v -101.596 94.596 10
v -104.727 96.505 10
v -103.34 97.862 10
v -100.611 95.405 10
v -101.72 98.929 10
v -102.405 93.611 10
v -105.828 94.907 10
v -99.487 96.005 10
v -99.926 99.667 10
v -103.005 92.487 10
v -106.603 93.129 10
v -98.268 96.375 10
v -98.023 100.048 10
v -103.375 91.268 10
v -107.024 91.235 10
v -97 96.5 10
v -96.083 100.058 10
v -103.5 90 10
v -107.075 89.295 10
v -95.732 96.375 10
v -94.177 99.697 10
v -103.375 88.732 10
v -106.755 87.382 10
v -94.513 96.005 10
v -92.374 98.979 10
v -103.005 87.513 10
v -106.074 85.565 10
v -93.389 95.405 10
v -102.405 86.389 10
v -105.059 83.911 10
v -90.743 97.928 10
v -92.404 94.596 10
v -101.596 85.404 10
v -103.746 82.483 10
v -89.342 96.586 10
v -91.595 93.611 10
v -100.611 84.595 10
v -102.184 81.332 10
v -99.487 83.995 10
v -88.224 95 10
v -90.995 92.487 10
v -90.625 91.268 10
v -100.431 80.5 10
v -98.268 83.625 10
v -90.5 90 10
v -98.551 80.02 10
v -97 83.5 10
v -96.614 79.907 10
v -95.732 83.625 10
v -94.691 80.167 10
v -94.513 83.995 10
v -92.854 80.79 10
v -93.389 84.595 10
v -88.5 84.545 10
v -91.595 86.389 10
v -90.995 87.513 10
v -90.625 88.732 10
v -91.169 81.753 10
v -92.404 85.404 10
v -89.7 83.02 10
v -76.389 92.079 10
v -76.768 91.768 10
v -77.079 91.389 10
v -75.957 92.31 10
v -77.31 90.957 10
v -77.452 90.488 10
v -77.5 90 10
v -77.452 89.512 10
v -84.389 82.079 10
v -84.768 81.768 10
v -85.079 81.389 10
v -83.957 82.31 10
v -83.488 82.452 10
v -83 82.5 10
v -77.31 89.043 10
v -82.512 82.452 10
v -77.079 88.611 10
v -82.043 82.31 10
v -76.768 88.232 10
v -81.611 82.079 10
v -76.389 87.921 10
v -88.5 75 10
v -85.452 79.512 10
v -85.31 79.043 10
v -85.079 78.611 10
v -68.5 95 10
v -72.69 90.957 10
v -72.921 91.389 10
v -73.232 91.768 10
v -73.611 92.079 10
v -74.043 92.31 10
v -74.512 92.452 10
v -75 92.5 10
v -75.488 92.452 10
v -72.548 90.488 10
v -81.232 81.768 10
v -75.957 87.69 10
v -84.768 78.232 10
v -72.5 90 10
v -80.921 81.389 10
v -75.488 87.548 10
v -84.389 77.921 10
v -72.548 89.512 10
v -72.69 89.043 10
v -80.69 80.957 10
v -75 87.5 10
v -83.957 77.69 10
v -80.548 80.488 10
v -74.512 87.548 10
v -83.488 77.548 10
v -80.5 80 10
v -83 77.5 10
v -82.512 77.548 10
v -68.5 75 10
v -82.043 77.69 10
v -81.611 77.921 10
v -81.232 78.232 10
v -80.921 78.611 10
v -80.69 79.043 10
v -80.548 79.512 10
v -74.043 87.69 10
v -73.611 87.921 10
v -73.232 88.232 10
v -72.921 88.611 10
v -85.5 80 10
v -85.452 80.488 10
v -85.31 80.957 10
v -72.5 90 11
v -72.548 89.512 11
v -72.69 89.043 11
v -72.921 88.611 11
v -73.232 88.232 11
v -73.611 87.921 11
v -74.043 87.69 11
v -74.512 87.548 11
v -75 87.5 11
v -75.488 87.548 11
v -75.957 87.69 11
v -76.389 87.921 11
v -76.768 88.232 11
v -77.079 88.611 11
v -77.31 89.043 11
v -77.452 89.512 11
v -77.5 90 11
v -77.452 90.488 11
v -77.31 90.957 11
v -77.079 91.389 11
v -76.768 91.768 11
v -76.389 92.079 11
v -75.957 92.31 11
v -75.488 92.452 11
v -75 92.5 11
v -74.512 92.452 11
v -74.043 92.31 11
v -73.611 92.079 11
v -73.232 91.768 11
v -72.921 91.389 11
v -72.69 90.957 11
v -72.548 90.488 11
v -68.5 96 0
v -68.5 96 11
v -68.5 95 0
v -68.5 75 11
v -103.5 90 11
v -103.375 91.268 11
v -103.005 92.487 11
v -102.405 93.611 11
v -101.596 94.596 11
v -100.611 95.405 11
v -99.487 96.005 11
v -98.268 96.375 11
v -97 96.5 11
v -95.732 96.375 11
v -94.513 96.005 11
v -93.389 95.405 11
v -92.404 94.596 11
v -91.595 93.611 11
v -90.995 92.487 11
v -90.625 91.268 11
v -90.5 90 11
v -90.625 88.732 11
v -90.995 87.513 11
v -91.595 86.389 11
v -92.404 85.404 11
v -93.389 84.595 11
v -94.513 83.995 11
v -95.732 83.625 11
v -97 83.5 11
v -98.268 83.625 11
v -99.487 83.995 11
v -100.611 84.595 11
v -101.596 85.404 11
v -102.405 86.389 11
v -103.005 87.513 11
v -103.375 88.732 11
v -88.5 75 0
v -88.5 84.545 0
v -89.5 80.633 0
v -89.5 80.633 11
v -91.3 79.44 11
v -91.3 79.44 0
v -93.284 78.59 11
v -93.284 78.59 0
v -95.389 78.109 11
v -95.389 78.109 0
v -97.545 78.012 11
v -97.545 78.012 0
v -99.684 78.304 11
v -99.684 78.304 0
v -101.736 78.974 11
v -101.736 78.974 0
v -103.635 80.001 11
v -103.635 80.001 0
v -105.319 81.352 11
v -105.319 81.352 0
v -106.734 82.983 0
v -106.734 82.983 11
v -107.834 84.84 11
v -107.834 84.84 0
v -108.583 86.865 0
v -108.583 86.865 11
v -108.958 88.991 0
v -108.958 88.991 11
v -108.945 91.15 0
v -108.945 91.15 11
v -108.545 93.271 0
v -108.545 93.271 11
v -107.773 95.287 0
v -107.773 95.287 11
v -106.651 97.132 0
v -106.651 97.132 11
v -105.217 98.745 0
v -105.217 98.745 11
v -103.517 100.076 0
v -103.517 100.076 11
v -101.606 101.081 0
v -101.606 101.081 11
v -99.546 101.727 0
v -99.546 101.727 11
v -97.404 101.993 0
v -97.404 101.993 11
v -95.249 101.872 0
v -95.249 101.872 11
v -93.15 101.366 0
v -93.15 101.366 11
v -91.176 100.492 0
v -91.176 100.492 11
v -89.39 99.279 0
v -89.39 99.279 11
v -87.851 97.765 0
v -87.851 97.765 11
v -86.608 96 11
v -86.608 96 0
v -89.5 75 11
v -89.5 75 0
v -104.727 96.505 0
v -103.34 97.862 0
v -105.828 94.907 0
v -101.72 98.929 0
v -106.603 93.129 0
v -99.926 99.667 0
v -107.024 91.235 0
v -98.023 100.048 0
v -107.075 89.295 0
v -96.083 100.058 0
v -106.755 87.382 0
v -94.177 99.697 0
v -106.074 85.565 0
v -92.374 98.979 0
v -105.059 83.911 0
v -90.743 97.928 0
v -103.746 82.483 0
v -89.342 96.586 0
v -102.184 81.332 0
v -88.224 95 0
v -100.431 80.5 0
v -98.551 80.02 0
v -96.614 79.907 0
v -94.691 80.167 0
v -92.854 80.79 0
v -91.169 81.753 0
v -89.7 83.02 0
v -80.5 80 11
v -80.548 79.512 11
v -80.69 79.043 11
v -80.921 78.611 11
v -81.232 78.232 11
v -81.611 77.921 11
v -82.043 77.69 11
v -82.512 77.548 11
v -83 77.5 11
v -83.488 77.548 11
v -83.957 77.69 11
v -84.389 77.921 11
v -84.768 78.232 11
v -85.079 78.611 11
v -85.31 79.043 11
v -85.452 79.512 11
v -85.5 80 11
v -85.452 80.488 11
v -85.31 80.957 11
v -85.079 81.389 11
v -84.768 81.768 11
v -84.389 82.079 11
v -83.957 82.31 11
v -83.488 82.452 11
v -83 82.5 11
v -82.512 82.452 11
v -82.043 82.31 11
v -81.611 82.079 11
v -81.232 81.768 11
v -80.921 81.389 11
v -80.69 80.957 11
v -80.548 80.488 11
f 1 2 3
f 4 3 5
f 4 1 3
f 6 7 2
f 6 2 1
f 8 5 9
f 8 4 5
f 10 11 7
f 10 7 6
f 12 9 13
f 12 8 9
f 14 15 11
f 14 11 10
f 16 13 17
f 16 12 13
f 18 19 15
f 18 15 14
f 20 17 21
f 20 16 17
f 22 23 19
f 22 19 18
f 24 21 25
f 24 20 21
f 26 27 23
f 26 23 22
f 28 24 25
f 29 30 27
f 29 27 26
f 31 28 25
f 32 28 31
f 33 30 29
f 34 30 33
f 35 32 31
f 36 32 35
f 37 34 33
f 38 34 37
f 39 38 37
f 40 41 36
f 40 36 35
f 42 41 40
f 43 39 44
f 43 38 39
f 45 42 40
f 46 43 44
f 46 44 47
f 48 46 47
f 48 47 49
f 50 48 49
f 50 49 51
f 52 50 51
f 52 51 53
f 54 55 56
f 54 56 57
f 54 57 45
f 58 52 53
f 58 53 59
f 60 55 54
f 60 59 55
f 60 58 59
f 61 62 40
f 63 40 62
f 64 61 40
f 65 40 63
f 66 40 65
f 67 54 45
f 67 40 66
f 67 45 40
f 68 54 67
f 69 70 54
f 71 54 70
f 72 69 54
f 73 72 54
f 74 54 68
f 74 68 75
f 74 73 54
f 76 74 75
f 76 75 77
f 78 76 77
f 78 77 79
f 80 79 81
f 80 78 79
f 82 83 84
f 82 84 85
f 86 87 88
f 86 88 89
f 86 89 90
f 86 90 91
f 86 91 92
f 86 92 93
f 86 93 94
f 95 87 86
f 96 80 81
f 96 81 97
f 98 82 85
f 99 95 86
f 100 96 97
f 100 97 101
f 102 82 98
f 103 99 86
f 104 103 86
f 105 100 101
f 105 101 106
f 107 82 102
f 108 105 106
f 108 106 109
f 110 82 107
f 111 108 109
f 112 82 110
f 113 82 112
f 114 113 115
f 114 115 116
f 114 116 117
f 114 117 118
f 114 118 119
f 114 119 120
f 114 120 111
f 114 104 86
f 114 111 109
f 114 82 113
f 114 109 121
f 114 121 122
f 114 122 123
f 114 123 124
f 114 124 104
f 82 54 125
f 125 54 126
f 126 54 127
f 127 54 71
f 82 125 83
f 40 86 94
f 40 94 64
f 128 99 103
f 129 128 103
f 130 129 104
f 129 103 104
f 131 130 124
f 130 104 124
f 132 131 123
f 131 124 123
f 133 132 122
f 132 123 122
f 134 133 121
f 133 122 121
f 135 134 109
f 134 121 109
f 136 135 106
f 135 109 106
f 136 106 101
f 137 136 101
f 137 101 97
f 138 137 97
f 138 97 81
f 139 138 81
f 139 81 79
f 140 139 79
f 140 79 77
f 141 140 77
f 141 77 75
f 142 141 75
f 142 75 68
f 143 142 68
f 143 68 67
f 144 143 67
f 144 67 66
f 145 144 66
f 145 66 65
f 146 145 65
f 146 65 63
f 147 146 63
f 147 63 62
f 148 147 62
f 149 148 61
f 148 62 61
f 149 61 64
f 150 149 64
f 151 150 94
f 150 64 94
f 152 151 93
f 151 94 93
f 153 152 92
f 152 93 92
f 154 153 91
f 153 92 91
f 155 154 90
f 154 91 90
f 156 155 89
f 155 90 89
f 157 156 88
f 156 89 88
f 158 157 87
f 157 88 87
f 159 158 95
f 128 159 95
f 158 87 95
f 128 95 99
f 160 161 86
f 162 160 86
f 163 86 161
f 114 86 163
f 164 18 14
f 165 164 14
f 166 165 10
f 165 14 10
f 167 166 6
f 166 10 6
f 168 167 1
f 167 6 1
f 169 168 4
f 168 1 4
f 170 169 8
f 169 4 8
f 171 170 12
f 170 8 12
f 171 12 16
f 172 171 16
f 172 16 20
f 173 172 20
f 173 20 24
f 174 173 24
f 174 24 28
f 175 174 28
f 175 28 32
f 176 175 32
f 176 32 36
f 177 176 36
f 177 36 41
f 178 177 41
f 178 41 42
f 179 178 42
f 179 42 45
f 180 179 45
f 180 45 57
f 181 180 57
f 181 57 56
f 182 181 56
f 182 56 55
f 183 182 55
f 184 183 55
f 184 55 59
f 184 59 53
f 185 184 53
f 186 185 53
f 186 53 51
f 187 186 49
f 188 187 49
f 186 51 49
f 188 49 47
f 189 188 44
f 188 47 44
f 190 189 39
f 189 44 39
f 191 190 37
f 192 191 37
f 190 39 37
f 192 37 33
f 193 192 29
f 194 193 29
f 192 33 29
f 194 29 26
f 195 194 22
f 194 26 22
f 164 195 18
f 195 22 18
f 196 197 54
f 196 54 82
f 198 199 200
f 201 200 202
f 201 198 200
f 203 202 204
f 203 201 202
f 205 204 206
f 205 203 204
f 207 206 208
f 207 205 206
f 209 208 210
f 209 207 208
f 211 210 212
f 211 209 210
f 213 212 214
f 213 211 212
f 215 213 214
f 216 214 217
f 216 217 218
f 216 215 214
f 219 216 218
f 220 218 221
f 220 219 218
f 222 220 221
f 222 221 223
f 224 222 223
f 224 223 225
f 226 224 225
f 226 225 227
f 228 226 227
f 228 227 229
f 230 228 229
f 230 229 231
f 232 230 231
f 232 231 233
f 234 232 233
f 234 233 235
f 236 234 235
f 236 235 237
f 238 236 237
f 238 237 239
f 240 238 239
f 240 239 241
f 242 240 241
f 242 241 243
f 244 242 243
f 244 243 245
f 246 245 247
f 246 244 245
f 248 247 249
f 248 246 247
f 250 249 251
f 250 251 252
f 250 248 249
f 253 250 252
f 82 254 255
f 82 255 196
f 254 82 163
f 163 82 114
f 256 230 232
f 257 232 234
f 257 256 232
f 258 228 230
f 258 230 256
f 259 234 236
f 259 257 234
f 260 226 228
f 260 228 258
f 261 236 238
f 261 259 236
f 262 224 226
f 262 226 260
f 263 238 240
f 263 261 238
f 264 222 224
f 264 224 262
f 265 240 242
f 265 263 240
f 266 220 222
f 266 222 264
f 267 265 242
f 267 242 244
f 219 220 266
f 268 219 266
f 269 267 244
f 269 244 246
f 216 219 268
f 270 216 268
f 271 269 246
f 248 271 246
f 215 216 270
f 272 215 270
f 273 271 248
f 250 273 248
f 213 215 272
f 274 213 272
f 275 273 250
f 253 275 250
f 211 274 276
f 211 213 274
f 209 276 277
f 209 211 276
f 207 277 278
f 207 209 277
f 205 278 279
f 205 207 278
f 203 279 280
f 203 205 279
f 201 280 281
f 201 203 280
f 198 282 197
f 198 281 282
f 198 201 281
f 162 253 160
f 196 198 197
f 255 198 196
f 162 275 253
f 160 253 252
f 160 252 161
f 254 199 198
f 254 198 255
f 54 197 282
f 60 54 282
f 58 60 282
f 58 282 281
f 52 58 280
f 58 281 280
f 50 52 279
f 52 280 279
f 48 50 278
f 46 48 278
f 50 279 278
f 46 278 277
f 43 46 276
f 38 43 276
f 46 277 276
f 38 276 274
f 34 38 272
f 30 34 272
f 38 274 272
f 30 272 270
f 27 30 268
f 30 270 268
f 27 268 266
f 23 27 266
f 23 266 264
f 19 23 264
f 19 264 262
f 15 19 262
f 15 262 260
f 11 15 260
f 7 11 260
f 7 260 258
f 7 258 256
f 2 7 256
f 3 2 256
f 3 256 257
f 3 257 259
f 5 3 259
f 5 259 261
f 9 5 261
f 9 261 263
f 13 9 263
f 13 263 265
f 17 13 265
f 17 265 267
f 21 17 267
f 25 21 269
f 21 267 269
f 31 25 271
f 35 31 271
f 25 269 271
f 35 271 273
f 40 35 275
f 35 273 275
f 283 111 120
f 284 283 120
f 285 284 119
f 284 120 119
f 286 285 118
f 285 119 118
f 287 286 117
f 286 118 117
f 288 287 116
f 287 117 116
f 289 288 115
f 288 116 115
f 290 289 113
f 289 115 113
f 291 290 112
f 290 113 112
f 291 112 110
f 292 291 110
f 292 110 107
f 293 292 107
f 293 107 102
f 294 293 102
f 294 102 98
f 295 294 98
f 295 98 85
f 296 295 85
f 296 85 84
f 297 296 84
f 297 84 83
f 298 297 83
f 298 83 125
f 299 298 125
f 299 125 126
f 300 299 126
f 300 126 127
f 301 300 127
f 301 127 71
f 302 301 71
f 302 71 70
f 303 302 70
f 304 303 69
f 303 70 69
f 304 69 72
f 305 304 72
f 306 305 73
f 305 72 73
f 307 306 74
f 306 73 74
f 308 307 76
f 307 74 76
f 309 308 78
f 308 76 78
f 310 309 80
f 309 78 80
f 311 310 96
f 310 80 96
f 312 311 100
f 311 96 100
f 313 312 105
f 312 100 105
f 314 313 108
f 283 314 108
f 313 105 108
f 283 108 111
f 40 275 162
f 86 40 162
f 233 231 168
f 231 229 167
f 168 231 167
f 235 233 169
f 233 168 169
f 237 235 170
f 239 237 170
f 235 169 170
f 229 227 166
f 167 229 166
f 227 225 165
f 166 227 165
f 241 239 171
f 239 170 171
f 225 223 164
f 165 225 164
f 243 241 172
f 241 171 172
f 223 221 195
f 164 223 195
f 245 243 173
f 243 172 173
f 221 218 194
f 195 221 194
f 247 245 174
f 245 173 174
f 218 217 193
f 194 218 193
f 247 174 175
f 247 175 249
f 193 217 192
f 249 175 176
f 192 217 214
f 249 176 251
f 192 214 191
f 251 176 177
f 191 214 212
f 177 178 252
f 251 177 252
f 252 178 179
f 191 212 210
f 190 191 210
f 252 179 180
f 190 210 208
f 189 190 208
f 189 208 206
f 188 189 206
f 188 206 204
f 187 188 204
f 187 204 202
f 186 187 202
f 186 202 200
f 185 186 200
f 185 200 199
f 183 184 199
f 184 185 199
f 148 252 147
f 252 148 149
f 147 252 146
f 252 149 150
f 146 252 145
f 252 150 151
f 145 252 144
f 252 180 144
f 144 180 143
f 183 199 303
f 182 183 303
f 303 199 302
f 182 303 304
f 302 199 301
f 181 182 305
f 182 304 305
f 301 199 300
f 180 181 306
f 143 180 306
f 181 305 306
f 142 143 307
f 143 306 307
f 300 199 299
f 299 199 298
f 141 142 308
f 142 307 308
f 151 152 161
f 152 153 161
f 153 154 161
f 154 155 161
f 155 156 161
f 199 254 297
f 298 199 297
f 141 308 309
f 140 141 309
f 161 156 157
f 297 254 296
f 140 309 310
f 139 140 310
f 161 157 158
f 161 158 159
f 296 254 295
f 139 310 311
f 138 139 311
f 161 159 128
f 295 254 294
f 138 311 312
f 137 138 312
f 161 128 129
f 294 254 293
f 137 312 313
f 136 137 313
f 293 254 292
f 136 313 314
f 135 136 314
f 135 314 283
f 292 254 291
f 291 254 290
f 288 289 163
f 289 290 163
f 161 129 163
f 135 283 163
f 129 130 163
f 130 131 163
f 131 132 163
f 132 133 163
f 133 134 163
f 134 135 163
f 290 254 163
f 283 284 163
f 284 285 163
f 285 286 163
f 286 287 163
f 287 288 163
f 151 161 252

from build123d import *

# Parameters (mm, degrees)
CYLINDER041_R          = 6.5
CYLINDER041_DEPTH      = 11
CYLINDER030_R          = 2.5
CYLINDER030_DEPTH      = 11
CYLINDER031_R          = 2.5
CYLINDER031_DEPTH      = 11
BOX008_W               = 1
BOX008_H               = 7
BOX008_DEPTH           = 11
BOX010_W               = 20
BOX010_H               = 20
BOX010_DEPTH           = 1
CYLINDER035_R          = 12
CYLINDER035_DEPTH      = 1
PAD015_DEPTH           = 10
BOX011_W               = 177
BOX011_H               = 100
BOX011_DEPTH           = 10
CYLINDER029_R          = 7.5
CYLINDER029_DEPTH      = 10
CYLINDER038_R          = 10
CYLINDER038_DEPTH      = 10
CYLINDER039_R          = 7.5
CYLINDER039_DEPTH      = 10
CYLINDER032_R          = 10
CYLINDER032_DEPTH      = 10
PAD012_DEPTH           = 6.5
PAD013_DEPTH           = 4
PAD014_DEPTH           = 10
CYLINDER034_R          = 7.5
CYLINDER034_DEPTH      = 10
CYLINDER037_R          = 10
CYLINDER037_DEPTH      = 10
CYLINDER036_R          = 7.5
CYLINDER036_DEPTH      = 10
CYLINDER033_R          = 10
CYLINDER033_DEPTH      = 10
TUBE001_R              = 12
TUBE001_R_2            = 10.1
TUBE001_DEPTH          = 10
BOX009_W               = 19
BOX009_H               = 1
BOX009_DEPTH           = 11
CUT032_PLACEMENT_ANGLE = 180


with BuildPart() as cilindro041:
    # Cylinder041 → Cylinder041 (new body)
    with BuildSketch(Plane(origin=(97, 90, 0), x_dir=(1, 0, 0), z_dir=(0, 0, 1))):
        Circle(CYLINDER041_R)
    extrude(amount=CYLINDER041_DEPTH)


with BuildPart() as cilindro030:
    # Cylinder030 → Cylinder030 (new body)
    with BuildSketch(Plane(origin=(-83, 10, 0), x_dir=(1, 0, 0), z_dir=(0, 0, 1))):
        Circle(CYLINDER030_R)
    extrude(amount=CYLINDER030_DEPTH)


with BuildPart() as cilindro031:
    # Cylinder031 → Cylinder031 (new body)
    with BuildSketch(Plane(origin=(-75, 0, 0), x_dir=(1, 0, 0), z_dir=(0, 0, 1))):
        Circle(CYLINDER031_R)
    extrude(amount=CYLINDER031_DEPTH)


with BuildPart() as cubo004:
    # Box008 → Box008 (new body)
    with BuildSketch(Plane(origin=(-89.5, 8, 0), x_dir=(1, 0, 0), z_dir=(0, 0, 1))):
        with Locations((0.5, 3.5)):
            Rectangle(BOX008_W, BOX008_H)
    extrude(amount=BOX008_DEPTH)


with BuildPart() as cubo006:
    # Box010 → Box010 (new body)
    with BuildSketch(Plane(origin=(-88.5, -5, 10), x_dir=(1, 0, 0), z_dir=(0, 0, 1))):
        with Locations((10, 10)):
            Rectangle(BOX010_W, BOX010_H)
    extrude(amount=BOX010_DEPTH)


with BuildPart() as cilindro035:
    # Cylinder035 → Cylinder035 (new body)
    with BuildSketch(Plane(origin=(-97, 0, 10), x_dir=(1, 0, 0), z_dir=(0, 0, 1))):
        Circle(CYLINDER035_R)
    extrude(amount=CYLINDER035_DEPTH)


with BuildPart() as body011:
    # Sketch013 → Pad015 (new body)
    with BuildSketch(Plane.XY):
        Polygon((8.5, 4.907477), (0, 9.814955), (-8.5, 4.907477), (-8.5, -4.907477), (0, -9.814955), (8.5, -4.907477), align=None)
    extrude(amount=PAD015_DEPTH)


with BuildPart() as body011_1:
    # Body011 placement: moved
    add(body011.part.moved(Location((0, 45.1, 0))))


with BuildPart() as cut026:
    # Box011 → Box011 (new body)
    with BuildSketch(Plane(origin=(-88.5, -5, 0), x_dir=(1, 0, 0), z_dir=(0, 0, 1))):
        with Locations((88.5, 50)):
            Rectangle(BOX011_W, BOX011_H)
    extrude(amount=BOX011_DEPTH)

    # Cut026: cut Body011
    add(body011_1.part, mode=Mode.SUBTRACT)


with BuildPart() as cilindro029:
    # Cylinder029 → Cylinder029 (new body)
    with BuildSketch(Plane(origin=(0, 20, 0), x_dir=(1, 0, 0), z_dir=(0, 0, 1))):
        Circle(CYLINDER029_R)
    extrude(amount=CYLINDER029_DEPTH)


with BuildPart() as unionbarra011:
    # Cylinder038 → Cylinder038 (new body)
    with BuildSketch(Plane(origin=(0, 20, 0), x_dir=(1, 0, 0), z_dir=(0, 0, 1))):
        Circle(CYLINDER038_R)
    extrude(amount=CYLINDER038_DEPTH)

    # Cut028: cut Cilindro029
    add(cilindro029.part, mode=Mode.SUBTRACT)


with BuildPart() as unionbarra011_1:
    # Cut028 placement: moved
    add(unionbarra011.part.moved(Location((-97, -20, 0))))


with BuildPart() as cilindro039:
    # Cylinder039 → Cylinder039 (new body)
    with BuildSketch(Plane(origin=(0, 20, 0), x_dir=(1, 0, 0), z_dir=(0, 0, 1))):
        Circle(CYLINDER039_R)
    extrude(amount=CYLINDER039_DEPTH)


with BuildPart() as fusion014:
    # Cylinder032 → Cylinder032 (new body)
    with BuildSketch(Plane(origin=(0, 20, 0), x_dir=(1, 0, 0), z_dir=(0, 0, 1))):
        Circle(CYLINDER032_R)
    extrude(amount=CYLINDER032_DEPTH)

    # Cut027: cut Cilindro039
    add(cilindro039.part, mode=Mode.SUBTRACT)


with BuildPart() as fusion014_1:
    # Cut027 placement: moved
    add(fusion014.part.moved(Location((97, -20, 0))))

    # Fusion014: union unionbarra011
    add(unionbarra011_1.part)


with BuildPart() as cuerpo006:
    # Sketch014 → Pad012 (new body)
    with BuildSketch(Plane.XY):
        Polygon((0, 7.505553), (-6.5, 3.752777), (-6.5, -3.752777), (0, -7.505553), (6.5, -3.752777), (6.5, 3.752777), align=None)
    extrude(amount=PAD012_DEPTH)

    # Sketch015 (on Face8 of Pad012) → Pad013 (join)
    with BuildSketch(Plane.XY.offset(6.5)):
        Polygon((0, 5.773503), (-5, 2.886751), (-5, -2.886751), (0, -5.773503), (5, -2.886751), (5, 2.886751), align=None)
    extrude(amount=PAD013_DEPTH)


with BuildPart() as cut029:
    # Sketch012 → Pad014 (new body)
    with BuildSketch(Plane.XY):
        Polygon((0, 9.814955), (-8.5, 4.907477), (-8.5, -4.907477), (0, -9.814955), (8.5, -4.907477), (8.5, 4.907477), align=None)
    extrude(amount=PAD014_DEPTH)

    # Cut029: cut Cuerpo006
    add(cuerpo006.part, mode=Mode.SUBTRACT)


with BuildPart() as cut029_1:
    # Cut029 placement: moved
    add(cut029.part.moved(Location((0, 45.1, 0))))


with BuildPart() as cilindro034:
    # Cylinder034 → Cylinder034 (new body)
    with BuildSketch(Plane(origin=(0, 20, 0), x_dir=(1, 0, 0), z_dir=(0, 0, 1))):
        Circle(CYLINDER034_R)
    extrude(amount=CYLINDER034_DEPTH)


with BuildPart() as unionbarra012:
    # Cylinder037 → Cylinder037 (new body)
    with BuildSketch(Plane(origin=(0, 20, 0), x_dir=(1, 0, 0), z_dir=(0, 0, 1))):
        Circle(CYLINDER037_R)
    extrude(amount=CYLINDER037_DEPTH)

    # Cut030: cut Cilindro034
    add(cilindro034.part, mode=Mode.SUBTRACT)


with BuildPart() as unionbarra012_1:
    # Cut030 placement: moved
    add(unionbarra012.part.moved(Location((-97, -20, 0))))


with BuildPart() as cilindro036:
    # Cylinder036 → Cylinder036 (new body)
    with BuildSketch(Plane(origin=(0, 20, 0), x_dir=(1, 0, 0), z_dir=(0, 0, 1))):
        Circle(CYLINDER036_R)
    extrude(amount=CYLINDER036_DEPTH)


with BuildPart() as fusion011:
    # Cylinder033 → Cylinder033 (new body)
    with BuildSketch(Plane(origin=(0, 20, 0), x_dir=(1, 0, 0), z_dir=(0, 0, 1))):
        Circle(CYLINDER033_R)
    extrude(amount=CYLINDER033_DEPTH)

    # Cut033: cut Cilindro036
    add(cilindro036.part, mode=Mode.SUBTRACT)


with BuildPart() as fusion011_1:
    # Cut033 placement: moved
    add(fusion011.part.moved(Location((97, -20, 0))))

    # Fusion013: union unionbarra012
    add(unionbarra012_1.part)


with BuildPart() as fusion011_2:
    # Fusion013 placement: moved
    add(fusion011_1.part.moved(Location((0, 90, 0))))

    # Fusion011: union Cut026, Fusion014, Cut029
    add(cut026.part)
    add(fusion014_1.part)
    add(cut029_1.part)


with BuildPart() as cut031:
    # Tube001 → Tube001 (new body)
    with BuildSketch(Plane(origin=(-97, 0, 0), x_dir=(1, 0, 0), z_dir=(0, 0, 1))):
        Circle(TUBE001_R)
        Circle(TUBE001_R_2, mode=Mode.SUBTRACT)
    extrude(amount=TUBE001_DEPTH)

    # Cut031: cut Fusion011
    add(fusion011_2.part, mode=Mode.SUBTRACT)


with BuildPart() as eng_arand_impar:
    # Box009 → Box009 (new body)
    with BuildSketch(Plane(origin=(-87.5, -6, 0), x_dir=(1, 0, 0), z_dir=(0, 0, 1))):
        with Locations((9.5, 0.5)):
            Rectangle(BOX009_W, BOX009_H)
    extrude(amount=BOX009_DEPTH)

    # Fusion012: union Cubo004, Cubo006, Cilindro035, Cut031
    add(cubo004.part)
    add(cubo006.part)
    add(cilindro035.part)
    add(cut031.part)

    # Cut025: cut Cilindro031
    add(cilindro031.part, mode=Mode.SUBTRACT)

    # Cut032: cut Cilindro030
    add(cilindro030.part, mode=Mode.SUBTRACT)


with BuildPart() as eng_arand_impar_1:
    # Cut032 placement: moved
    add(eng_arand_impar.part.moved(Location((0, 90, 0))).rotate(Axis((0, 90, 0), (0, 0, 1)), CUT032_PLACEMENT_ANGLE))

    # Cut035: cut Cilindro041
    add(cilindro041.part, mode=Mode.SUBTRACT)


with BuildPart() as eng_arandela_par:
    # Part__Mirroring001: instance of eng_arand_impar
    add(eng_arand_impar_1.part.mirror(Plane(origin=(0, 0, 0), x_dir=(0, -1, 0), z_dir=(1, 0, 0))))


solid = eng_arandela_par.part
